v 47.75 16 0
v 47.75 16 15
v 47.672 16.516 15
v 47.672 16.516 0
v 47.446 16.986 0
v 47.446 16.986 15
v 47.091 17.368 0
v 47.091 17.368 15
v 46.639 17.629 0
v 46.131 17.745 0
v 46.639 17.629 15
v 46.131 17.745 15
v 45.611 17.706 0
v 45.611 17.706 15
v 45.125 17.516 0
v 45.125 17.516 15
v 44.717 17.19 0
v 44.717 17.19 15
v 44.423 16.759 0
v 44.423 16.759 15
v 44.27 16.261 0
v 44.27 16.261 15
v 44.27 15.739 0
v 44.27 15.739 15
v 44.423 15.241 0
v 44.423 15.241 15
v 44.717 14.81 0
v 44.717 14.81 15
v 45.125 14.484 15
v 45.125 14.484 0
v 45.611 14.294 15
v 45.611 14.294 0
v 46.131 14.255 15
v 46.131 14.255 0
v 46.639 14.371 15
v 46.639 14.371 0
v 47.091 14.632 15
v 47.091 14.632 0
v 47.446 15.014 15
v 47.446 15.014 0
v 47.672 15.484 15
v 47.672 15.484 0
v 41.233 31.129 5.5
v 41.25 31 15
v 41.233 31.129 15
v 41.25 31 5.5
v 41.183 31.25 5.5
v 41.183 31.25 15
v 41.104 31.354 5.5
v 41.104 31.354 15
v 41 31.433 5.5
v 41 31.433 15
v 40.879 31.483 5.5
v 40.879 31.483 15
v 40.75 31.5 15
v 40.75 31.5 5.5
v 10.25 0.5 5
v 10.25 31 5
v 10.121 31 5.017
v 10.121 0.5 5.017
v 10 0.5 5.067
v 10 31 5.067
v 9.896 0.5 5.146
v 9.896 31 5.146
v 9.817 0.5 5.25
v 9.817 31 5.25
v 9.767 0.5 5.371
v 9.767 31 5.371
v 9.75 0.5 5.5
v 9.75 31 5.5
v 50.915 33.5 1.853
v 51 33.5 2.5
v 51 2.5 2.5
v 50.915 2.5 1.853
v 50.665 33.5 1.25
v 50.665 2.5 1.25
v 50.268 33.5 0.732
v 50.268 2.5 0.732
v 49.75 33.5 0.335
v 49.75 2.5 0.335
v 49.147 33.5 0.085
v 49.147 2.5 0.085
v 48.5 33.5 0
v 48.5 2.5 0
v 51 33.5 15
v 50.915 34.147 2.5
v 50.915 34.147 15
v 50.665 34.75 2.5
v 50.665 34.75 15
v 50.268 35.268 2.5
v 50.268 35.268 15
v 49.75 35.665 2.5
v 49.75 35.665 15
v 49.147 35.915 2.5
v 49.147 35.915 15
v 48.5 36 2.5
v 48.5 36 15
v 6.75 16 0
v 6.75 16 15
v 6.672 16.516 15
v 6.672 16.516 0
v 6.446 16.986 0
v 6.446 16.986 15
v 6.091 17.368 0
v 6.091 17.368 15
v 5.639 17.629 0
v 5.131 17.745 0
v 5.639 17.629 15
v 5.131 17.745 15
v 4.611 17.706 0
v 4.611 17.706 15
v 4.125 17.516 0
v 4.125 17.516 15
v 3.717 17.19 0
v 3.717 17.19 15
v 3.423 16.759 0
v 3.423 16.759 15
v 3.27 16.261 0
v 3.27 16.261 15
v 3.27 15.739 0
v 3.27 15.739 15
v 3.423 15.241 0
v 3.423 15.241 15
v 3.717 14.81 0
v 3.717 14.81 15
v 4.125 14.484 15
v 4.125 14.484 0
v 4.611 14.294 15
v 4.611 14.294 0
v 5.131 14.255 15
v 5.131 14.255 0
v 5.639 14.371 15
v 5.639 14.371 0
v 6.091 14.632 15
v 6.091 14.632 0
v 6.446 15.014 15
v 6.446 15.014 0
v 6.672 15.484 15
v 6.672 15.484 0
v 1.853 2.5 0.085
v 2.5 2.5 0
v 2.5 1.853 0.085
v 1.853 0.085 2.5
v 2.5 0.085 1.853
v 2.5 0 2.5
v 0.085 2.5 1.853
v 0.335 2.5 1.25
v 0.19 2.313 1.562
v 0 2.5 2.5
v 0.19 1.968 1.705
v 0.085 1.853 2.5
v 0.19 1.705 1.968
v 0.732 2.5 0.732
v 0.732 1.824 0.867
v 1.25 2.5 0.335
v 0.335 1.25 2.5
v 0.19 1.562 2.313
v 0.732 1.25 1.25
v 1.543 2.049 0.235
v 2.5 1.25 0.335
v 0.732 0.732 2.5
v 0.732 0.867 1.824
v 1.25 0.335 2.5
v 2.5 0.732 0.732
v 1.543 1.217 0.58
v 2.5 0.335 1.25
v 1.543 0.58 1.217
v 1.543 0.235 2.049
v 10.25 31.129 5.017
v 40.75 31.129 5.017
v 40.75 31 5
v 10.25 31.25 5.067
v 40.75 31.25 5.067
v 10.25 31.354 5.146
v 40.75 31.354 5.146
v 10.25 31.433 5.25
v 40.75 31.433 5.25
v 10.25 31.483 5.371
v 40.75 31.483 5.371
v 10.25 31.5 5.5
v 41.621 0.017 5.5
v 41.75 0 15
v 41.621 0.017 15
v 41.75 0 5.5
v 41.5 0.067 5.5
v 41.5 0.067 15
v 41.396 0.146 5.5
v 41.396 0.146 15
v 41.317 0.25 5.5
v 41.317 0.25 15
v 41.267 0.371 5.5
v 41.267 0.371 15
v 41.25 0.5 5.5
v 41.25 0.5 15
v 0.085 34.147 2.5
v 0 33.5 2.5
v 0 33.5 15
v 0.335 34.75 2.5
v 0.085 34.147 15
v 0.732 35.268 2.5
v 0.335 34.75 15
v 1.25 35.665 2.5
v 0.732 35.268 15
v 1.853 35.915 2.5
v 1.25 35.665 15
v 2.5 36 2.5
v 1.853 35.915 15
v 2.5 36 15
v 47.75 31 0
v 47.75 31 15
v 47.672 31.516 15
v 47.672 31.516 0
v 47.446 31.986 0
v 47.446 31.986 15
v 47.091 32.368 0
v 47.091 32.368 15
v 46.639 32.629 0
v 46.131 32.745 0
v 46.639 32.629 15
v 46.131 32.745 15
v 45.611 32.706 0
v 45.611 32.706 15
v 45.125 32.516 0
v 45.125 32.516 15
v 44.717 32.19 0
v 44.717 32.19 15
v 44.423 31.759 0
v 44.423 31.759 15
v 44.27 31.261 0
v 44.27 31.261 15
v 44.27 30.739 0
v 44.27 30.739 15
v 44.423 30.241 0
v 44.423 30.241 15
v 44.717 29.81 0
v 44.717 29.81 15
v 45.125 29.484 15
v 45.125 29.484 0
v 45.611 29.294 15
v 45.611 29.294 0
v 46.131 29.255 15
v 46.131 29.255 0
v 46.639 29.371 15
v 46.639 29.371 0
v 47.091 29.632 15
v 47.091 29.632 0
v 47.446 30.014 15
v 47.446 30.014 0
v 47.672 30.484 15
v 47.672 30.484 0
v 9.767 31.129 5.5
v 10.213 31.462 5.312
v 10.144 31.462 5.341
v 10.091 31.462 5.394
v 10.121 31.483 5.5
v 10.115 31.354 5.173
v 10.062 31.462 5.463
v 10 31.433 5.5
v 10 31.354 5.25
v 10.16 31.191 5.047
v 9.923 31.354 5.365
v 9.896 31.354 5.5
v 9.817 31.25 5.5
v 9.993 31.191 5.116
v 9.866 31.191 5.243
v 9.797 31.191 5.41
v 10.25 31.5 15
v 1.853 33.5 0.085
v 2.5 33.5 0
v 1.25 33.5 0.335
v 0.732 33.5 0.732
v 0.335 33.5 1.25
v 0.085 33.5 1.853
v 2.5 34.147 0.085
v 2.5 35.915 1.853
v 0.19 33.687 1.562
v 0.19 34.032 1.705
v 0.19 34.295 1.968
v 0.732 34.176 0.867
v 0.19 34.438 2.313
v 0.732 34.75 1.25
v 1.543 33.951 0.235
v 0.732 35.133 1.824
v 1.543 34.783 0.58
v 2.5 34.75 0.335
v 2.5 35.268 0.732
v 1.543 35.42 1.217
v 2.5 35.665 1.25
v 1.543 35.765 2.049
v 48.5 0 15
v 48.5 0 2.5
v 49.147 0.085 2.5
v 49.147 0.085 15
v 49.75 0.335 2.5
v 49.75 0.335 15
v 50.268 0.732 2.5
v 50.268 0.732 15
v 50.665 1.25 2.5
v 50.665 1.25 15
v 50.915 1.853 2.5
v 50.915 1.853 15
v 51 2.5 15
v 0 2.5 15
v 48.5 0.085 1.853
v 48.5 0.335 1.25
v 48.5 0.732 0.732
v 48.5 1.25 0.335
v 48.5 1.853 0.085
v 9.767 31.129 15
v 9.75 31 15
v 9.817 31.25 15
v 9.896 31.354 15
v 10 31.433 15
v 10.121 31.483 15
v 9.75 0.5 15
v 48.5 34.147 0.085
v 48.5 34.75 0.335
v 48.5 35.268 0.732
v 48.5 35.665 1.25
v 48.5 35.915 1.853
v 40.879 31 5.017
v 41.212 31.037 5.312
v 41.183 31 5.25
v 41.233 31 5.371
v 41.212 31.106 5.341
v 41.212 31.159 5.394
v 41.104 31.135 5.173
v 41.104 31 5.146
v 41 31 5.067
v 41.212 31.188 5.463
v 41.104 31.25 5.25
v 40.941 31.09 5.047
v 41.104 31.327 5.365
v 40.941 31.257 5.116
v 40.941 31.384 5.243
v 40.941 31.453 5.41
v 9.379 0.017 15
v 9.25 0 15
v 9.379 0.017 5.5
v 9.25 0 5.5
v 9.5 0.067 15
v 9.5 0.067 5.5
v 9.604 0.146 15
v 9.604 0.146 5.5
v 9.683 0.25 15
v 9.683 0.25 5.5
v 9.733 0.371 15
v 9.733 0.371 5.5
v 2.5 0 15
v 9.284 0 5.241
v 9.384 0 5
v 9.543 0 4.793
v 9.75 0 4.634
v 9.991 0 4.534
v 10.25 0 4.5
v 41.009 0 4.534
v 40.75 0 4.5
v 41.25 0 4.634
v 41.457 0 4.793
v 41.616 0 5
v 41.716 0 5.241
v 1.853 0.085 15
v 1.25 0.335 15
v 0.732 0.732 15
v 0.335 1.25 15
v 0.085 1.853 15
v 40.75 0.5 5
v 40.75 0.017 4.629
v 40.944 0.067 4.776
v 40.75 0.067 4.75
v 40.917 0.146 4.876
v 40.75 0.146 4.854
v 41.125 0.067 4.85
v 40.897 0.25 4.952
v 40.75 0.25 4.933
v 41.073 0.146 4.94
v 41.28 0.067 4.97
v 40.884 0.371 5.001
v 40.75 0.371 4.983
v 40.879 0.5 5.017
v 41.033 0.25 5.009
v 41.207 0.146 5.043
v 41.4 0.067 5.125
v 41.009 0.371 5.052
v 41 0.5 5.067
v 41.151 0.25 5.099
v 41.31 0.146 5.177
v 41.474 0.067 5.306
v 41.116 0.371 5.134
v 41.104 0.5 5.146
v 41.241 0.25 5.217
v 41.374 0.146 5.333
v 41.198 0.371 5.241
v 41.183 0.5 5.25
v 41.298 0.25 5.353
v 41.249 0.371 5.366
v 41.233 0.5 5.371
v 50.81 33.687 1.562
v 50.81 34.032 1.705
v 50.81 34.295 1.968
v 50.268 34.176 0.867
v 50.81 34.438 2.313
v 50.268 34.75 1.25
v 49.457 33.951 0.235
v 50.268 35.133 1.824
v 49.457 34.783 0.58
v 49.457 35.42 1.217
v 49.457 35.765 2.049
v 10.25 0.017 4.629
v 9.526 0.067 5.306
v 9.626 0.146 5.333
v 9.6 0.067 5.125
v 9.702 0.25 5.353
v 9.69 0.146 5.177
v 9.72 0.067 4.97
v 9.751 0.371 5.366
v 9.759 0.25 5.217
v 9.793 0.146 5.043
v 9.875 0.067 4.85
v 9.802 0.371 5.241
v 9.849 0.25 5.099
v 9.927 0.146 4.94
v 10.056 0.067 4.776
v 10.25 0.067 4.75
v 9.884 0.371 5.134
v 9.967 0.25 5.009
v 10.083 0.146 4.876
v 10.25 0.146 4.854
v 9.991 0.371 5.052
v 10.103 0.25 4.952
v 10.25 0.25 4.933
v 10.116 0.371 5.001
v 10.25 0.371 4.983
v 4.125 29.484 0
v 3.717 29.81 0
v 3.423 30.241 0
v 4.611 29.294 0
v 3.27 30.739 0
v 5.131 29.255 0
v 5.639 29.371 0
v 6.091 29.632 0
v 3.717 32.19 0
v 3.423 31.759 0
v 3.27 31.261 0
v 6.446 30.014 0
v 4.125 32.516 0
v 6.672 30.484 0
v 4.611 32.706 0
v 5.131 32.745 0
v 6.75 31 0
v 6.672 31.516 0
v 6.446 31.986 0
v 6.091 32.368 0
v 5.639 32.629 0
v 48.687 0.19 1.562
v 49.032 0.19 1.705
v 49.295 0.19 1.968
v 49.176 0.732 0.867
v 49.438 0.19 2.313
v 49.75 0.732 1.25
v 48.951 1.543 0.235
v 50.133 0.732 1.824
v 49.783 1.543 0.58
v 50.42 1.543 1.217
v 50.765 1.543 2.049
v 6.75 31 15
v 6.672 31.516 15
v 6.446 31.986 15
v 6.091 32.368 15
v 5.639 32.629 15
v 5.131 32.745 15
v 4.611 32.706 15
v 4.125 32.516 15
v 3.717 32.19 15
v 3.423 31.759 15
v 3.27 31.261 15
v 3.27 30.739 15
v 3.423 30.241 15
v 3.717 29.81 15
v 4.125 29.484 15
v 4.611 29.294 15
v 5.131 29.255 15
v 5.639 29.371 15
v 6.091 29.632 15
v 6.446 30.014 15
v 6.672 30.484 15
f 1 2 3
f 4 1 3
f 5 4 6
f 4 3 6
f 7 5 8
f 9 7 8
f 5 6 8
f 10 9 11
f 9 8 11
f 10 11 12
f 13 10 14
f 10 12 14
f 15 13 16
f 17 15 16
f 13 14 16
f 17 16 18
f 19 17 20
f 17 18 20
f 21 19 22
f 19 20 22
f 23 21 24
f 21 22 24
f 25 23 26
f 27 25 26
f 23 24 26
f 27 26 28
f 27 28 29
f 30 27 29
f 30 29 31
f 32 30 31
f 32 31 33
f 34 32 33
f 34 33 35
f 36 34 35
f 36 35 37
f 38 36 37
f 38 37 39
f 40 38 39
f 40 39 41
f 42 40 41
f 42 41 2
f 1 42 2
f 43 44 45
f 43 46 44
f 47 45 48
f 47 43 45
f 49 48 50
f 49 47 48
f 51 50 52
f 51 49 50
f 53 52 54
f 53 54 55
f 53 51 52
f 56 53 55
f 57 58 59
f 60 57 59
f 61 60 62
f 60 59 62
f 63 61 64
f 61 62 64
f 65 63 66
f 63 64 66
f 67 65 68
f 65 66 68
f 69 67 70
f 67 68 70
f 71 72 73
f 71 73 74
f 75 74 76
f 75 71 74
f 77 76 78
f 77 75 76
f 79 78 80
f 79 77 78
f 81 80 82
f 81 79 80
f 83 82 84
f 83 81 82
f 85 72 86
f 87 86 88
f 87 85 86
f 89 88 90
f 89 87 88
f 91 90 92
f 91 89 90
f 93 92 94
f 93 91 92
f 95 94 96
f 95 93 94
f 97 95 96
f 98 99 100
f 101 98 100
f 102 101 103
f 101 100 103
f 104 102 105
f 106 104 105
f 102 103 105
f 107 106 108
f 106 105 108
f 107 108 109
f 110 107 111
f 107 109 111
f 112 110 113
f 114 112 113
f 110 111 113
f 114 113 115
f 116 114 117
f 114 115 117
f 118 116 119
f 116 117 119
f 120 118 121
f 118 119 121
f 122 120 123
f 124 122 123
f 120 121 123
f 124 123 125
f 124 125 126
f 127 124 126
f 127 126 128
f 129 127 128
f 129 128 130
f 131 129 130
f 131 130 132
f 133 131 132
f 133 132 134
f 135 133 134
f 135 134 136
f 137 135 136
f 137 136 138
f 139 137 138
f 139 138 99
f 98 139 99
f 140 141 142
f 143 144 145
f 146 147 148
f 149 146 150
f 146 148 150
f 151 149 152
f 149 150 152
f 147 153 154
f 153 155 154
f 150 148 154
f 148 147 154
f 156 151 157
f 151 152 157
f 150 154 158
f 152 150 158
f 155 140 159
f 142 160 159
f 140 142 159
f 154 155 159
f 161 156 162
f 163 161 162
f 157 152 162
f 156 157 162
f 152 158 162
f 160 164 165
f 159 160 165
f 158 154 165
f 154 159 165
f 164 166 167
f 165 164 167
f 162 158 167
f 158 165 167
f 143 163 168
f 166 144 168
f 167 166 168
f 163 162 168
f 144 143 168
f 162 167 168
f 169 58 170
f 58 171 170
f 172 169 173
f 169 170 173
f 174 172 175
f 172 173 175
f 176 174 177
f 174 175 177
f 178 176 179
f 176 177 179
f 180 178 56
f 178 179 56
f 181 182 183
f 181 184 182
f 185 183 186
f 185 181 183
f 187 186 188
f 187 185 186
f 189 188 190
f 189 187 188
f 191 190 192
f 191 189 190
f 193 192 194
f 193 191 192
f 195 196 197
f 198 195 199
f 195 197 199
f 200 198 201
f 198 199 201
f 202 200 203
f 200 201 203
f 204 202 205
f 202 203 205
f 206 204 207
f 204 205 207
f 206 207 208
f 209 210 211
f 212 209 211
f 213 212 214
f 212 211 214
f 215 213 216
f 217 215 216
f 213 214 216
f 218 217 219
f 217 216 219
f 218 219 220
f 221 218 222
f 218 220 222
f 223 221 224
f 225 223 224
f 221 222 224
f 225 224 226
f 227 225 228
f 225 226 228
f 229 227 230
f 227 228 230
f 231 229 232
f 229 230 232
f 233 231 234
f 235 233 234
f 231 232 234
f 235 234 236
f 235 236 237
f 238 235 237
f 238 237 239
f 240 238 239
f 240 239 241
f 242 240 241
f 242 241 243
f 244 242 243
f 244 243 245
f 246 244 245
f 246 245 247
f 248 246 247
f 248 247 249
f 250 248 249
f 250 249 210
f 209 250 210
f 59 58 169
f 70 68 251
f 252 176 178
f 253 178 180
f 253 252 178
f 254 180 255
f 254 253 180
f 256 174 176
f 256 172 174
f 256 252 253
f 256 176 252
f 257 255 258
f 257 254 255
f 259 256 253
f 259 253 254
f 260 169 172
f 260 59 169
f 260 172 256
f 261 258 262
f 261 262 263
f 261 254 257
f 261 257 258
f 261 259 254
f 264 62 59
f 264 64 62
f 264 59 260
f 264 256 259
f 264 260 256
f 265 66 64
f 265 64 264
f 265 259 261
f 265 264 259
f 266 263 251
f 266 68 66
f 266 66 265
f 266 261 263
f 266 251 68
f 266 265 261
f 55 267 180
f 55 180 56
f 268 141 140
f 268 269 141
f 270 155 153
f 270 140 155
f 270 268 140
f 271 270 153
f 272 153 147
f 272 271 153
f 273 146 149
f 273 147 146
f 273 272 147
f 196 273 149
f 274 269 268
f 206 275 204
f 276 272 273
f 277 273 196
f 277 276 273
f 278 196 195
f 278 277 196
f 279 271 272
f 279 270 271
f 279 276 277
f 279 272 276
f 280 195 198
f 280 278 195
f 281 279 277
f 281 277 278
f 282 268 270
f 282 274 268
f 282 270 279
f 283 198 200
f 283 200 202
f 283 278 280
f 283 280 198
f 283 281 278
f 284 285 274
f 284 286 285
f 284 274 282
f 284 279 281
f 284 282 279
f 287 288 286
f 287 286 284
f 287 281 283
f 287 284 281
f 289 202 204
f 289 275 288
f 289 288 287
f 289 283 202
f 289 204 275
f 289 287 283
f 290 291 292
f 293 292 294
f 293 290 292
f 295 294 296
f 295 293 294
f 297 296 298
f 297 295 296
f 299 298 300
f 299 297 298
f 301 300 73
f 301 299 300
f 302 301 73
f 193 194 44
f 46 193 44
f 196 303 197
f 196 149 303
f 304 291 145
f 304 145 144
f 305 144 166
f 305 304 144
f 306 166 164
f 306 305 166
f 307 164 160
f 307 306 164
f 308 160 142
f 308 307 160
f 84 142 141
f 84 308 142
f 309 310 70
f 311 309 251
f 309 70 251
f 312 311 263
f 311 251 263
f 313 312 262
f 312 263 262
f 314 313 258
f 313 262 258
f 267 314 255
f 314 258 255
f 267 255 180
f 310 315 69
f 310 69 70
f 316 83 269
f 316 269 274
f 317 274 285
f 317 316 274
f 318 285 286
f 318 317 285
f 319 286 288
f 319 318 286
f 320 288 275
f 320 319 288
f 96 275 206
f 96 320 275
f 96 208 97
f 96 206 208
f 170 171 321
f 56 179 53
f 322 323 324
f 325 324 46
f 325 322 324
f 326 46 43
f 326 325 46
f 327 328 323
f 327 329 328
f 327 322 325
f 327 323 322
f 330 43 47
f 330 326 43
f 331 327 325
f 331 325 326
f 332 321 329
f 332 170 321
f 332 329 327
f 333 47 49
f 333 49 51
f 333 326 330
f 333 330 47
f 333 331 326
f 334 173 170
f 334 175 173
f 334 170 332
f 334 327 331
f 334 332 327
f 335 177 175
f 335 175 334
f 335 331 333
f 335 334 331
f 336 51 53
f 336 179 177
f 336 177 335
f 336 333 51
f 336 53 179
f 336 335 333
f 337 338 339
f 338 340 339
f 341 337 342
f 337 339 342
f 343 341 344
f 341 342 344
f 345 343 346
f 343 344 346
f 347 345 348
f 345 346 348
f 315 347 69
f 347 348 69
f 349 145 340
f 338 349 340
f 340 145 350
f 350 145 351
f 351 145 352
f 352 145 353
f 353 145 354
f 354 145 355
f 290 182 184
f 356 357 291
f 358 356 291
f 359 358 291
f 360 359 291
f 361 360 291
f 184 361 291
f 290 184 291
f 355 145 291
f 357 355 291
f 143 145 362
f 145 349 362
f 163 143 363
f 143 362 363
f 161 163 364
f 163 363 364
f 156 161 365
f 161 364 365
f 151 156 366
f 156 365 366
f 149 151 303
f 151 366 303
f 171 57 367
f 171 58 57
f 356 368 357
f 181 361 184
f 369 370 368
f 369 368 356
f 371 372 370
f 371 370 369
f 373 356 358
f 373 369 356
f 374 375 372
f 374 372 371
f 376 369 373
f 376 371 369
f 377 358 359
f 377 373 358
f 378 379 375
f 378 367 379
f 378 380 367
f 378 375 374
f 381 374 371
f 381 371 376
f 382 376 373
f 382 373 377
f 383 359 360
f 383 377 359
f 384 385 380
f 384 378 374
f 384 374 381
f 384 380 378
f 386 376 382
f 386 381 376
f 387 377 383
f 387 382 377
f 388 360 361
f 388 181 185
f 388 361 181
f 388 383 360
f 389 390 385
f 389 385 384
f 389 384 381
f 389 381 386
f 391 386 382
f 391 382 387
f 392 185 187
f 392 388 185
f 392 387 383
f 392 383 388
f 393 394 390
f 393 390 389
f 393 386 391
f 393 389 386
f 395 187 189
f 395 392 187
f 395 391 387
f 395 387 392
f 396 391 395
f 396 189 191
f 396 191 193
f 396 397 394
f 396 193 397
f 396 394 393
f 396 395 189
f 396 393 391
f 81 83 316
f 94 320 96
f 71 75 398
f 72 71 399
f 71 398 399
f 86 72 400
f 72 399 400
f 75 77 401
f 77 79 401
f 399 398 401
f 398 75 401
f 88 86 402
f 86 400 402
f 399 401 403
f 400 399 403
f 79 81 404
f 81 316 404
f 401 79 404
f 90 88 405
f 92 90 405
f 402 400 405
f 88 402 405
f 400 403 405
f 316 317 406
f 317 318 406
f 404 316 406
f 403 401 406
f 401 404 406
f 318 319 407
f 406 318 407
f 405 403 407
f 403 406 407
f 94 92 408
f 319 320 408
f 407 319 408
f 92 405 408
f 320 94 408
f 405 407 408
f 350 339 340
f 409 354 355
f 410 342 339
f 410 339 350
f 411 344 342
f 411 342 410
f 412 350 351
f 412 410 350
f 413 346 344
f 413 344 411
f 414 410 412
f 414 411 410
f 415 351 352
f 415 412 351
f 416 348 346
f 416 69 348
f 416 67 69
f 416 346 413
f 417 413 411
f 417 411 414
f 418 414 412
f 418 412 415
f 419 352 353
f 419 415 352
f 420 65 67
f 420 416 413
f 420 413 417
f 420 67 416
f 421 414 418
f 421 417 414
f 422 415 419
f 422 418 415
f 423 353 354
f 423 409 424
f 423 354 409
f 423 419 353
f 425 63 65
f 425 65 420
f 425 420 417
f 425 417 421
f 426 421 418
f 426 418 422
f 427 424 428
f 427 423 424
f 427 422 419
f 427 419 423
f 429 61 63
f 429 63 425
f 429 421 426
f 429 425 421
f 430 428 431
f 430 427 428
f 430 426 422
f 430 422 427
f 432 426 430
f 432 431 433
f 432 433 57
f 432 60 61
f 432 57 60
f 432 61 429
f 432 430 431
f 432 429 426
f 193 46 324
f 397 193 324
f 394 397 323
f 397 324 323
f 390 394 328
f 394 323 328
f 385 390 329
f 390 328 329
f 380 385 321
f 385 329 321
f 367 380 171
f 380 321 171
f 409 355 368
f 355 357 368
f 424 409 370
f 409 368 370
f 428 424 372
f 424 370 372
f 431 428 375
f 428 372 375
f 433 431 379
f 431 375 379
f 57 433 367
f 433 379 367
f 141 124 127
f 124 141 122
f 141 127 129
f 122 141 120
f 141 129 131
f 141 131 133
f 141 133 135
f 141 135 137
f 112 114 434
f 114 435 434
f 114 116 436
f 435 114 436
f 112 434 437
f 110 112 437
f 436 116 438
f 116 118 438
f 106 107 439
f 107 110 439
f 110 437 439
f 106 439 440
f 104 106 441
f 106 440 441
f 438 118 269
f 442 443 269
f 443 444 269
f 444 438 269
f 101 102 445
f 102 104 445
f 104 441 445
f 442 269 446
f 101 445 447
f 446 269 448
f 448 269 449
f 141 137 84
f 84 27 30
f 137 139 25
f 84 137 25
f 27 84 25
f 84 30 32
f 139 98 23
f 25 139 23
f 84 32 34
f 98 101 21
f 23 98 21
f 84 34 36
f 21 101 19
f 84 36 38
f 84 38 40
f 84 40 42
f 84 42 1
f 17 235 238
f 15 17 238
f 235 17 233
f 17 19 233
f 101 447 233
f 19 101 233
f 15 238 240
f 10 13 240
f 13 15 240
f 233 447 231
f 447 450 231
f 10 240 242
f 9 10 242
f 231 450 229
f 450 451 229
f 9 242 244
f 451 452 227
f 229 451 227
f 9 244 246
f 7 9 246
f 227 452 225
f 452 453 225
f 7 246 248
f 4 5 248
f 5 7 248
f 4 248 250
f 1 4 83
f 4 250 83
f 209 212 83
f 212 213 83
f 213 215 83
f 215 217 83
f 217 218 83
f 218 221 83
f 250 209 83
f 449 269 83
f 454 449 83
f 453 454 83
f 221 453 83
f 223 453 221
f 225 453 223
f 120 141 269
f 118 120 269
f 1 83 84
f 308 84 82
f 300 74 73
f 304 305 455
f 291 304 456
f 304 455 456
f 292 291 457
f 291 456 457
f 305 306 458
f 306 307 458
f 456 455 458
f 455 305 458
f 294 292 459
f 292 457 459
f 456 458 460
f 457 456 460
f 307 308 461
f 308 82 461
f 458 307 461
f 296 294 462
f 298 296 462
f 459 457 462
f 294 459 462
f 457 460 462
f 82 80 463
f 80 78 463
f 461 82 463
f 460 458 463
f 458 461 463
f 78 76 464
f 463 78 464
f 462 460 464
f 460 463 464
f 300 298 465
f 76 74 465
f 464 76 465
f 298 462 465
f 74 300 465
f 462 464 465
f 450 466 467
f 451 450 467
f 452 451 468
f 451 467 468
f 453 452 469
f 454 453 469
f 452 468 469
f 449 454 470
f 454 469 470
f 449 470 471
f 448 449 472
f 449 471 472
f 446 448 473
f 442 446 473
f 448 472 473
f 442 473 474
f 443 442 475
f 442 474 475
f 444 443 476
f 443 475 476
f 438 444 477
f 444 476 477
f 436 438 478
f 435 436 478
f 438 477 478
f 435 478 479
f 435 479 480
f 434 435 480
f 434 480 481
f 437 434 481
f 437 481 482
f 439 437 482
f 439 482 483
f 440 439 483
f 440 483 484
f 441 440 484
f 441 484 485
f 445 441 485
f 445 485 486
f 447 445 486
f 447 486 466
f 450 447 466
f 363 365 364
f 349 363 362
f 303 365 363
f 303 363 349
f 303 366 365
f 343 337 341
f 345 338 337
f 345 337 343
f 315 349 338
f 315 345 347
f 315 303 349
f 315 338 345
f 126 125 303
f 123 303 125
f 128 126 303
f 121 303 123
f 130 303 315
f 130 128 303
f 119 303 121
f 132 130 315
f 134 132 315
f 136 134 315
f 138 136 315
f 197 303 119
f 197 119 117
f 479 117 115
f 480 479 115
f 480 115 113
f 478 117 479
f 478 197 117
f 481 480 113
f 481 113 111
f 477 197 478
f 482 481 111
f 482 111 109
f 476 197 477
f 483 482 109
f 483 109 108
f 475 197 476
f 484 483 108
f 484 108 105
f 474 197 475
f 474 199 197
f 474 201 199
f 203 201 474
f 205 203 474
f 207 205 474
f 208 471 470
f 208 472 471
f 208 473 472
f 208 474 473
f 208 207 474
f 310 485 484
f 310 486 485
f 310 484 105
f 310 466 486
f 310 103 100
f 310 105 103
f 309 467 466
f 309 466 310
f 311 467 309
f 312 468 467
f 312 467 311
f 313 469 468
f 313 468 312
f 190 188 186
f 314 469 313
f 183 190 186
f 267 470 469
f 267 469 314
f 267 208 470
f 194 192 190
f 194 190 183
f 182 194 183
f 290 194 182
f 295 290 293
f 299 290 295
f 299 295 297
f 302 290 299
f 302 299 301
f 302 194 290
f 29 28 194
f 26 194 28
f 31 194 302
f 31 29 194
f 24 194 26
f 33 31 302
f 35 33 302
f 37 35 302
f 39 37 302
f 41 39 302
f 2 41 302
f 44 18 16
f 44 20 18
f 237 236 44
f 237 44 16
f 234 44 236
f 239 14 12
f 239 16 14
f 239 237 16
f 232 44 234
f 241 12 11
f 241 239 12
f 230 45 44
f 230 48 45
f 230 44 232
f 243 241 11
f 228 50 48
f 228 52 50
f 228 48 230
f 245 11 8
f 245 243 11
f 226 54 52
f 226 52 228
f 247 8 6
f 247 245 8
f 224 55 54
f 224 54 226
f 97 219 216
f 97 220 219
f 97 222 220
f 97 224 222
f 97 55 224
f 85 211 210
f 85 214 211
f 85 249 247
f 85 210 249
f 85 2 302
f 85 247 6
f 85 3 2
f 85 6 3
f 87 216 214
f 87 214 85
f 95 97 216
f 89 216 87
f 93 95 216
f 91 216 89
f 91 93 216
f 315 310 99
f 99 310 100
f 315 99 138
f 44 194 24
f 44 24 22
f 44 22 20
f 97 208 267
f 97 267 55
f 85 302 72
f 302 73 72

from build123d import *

# Parameters (mm, degrees)
SKETCH1_W           = 51
SKETCH1_H           = 36
BOSS_EXTRUDE1_DEPTH = 15
SKETCH2_W           = 31.5
SKETCH2_H           = 31.5
CUT_EXTRUDE1_DEPTH  = 10
SKETCH3_R           = 1.75
CUT_EXTRUDE2_DEPTH  = 65.202803677
FILLET1_R           = 0.5
FILLET2_R           = 2.5


with BuildPart() as part:
    # Sketch1 → Boss-Extrude1 (new body)
    with BuildSketch(Plane.XY):
        with Locations((25.5, 18)):
            Rectangle(SKETCH1_W, SKETCH1_H)
    extrude(amount=BOSS_EXTRUDE1_DEPTH)

    # Sketch2 → Cut-Extrude1 (cut)
    with BuildSketch(Plane.XY.offset(15)):
        with Locations((25.5, 15.75)):
            Rectangle(SKETCH2_W, SKETCH2_H)
    extrude(amount=-CUT_EXTRUDE1_DEPTH, mode=Mode.SUBTRACT)

    # Sketch3 → Cut-Extrude2 (cut, through all)
    with BuildSketch(Plane.XY.offset(15)):
        with Locations((5, 31)):
            Circle(SKETCH3_R)
        with Locations((5, 16)):
            Circle(SKETCH3_R)
        with Locations((46, 31)):
            Circle(SKETCH3_R)
        with Locations((46, 16)):
            Circle(SKETCH3_R)
    extrude(amount=-CUT_EXTRUDE2_DEPTH, mode=Mode.SUBTRACT)

    # Fillet1
    fillet1_edges = [part.edges().sort_by_distance(p)[0] for p in [
        (25.5, 0, 5),
        (41.25, 0, 10),
        (9.75, 15.75, 5),
        (9.75, 0, 10),
        (25.5, 31.5, 5),
        (9.75, 31.5, 10),
        (41.25, 15.75, 5),
        (41.25, 31.5, 10),
    ]]
    fillet(fillet1_edges, radius=FILLET1_R)

    # Fillet2
    fillet2_edges = [part.edges().sort_by_distance(p)[0] for p in [
        (25.5, 36, 0),
        (51, 18, 0),
        (25.5, 0, 0),
        (0, 18, 0),
        (0, 36, 7.5),
        (51, 36, 7.5),
        (51, 0, 7.5),
        (0, 0, 7.5),
    ]]
    fillet(fillet2_edges, radius=FILLET2_R)


solid = part.part
